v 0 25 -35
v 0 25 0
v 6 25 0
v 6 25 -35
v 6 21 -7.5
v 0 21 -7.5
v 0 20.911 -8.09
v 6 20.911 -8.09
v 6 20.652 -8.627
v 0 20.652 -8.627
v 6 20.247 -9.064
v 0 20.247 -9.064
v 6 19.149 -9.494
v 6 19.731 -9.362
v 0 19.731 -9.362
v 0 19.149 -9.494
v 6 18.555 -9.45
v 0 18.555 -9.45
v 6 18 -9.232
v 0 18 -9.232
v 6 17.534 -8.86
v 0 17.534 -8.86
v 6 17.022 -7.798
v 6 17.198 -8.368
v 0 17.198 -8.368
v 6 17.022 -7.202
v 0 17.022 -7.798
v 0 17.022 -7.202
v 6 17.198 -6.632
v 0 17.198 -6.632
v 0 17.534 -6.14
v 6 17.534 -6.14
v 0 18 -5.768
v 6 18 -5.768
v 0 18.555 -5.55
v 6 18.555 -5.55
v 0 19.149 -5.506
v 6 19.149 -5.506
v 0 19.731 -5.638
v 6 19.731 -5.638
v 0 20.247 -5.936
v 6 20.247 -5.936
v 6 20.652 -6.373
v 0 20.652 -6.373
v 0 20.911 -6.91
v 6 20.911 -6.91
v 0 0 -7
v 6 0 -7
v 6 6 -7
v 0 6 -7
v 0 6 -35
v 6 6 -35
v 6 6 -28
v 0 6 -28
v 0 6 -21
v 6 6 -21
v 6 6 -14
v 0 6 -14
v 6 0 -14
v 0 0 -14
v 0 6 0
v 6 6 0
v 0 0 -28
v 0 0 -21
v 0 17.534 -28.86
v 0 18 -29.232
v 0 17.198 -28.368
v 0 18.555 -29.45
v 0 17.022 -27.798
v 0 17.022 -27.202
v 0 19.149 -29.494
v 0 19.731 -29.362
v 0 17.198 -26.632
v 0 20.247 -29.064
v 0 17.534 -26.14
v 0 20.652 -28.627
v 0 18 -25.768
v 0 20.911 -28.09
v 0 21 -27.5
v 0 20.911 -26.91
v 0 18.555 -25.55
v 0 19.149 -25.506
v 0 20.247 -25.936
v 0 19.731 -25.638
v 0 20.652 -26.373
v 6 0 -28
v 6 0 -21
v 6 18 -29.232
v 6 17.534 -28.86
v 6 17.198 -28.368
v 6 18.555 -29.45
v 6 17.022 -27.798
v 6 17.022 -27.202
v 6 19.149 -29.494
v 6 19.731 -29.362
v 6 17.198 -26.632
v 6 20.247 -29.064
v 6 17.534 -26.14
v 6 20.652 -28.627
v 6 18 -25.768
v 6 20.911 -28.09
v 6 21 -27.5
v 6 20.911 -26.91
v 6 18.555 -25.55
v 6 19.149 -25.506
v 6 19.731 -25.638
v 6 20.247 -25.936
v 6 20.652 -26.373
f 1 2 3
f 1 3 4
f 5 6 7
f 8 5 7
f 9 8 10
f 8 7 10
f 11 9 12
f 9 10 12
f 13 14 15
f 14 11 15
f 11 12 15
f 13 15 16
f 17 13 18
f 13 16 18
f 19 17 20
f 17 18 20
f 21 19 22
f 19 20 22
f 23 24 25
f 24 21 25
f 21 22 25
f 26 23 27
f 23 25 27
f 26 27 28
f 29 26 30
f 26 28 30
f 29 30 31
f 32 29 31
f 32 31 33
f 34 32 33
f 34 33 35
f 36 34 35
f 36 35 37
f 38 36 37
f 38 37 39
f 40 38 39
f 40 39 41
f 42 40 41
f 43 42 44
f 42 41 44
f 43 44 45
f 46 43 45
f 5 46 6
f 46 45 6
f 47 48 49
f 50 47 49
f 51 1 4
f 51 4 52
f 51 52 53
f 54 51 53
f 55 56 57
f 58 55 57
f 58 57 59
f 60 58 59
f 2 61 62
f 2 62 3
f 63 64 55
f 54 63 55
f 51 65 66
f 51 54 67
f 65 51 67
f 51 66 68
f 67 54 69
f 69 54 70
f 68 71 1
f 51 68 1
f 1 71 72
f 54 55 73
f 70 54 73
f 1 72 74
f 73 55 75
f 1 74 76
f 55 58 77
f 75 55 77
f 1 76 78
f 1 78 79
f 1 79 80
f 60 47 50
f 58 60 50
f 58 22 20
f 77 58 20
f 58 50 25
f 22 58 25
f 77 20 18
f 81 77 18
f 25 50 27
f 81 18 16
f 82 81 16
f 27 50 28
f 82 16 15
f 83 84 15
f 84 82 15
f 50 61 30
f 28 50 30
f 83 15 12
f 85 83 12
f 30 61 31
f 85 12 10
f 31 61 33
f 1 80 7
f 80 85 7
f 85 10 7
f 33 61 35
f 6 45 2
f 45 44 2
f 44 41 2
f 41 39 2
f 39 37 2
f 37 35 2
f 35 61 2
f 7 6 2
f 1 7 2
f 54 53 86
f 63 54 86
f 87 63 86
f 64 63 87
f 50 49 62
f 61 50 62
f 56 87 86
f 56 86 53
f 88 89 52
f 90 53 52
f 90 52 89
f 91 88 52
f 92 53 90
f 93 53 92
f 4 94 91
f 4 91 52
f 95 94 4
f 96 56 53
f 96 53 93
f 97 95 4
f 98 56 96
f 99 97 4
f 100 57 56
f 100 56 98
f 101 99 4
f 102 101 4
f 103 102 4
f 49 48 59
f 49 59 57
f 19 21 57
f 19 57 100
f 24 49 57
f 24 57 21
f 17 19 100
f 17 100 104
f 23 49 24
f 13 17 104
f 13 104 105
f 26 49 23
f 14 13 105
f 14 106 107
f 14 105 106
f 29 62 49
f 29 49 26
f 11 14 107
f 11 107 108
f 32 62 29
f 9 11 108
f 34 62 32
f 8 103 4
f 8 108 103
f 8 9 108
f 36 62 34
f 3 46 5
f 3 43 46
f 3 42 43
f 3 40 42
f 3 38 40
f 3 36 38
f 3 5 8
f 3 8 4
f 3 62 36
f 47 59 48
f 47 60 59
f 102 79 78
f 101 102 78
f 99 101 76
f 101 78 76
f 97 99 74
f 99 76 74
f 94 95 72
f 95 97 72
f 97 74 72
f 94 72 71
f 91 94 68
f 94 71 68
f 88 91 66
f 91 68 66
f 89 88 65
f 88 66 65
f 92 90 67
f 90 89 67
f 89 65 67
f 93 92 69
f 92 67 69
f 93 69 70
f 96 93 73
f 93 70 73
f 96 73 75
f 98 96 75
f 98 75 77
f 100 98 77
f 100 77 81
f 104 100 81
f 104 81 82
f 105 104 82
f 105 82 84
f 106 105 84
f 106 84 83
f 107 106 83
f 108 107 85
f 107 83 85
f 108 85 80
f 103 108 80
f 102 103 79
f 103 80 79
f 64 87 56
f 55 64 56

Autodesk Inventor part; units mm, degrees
ref_plane "YZ Plane" through (0, 0, 0) normal (1, 0, 0) x (0, 1, 0)
ref_plane "XZ Plane" through (0, 0, 0) normal (0, 1, 0) x (-1, 0, 0)
ref_plane "XY Plane" through (0, 0, 0) normal (0, 0, 1) x (1, 0, 0)
sketch "Sketch1" plane through (0, 0, 0) normal (1, 0, 0) x (0, 1, 0)
  line L0 (0, 0) -> (25, 0)
  line L1 (25, 0) -> (25, -35)
  line L2 (25, -35) -> (0, -35)
  line L3 (0, -35) -> (0, 0)
  circle A0 centre (19, -7.5) radius 2
  circle A1 centre (19, -27.5) radius 2
  dimension "d0" = 25
  dimension "d1" = 35
  dimension "d5" = 4
  dimension "d6" = 4
extrude "Extrusion1" add sketch "Sketch1" along normal blind 6
sketch "Sketch2" plane through (6, 0, 0) normal (1, 0, 0) x (0, 0, -1)
  line L0 (0, 0) -> (7, 0)
  line L1 (7, 0) -> (7, 6)
  line L2 (7, 6) -> (0, 6)
  line L3 (0, 6) -> (0, 0)
  dimension "d9" = 7
  dimension "d10" = 6
extrude "Extrusion2" cut sketch "Sketch2" against normal blind 6
pattern_linear "Rectangular Pattern1" count 3 spacing 14 along (0, 0, -1) of "Extrusion2"
properties part number "g_mount 1"
